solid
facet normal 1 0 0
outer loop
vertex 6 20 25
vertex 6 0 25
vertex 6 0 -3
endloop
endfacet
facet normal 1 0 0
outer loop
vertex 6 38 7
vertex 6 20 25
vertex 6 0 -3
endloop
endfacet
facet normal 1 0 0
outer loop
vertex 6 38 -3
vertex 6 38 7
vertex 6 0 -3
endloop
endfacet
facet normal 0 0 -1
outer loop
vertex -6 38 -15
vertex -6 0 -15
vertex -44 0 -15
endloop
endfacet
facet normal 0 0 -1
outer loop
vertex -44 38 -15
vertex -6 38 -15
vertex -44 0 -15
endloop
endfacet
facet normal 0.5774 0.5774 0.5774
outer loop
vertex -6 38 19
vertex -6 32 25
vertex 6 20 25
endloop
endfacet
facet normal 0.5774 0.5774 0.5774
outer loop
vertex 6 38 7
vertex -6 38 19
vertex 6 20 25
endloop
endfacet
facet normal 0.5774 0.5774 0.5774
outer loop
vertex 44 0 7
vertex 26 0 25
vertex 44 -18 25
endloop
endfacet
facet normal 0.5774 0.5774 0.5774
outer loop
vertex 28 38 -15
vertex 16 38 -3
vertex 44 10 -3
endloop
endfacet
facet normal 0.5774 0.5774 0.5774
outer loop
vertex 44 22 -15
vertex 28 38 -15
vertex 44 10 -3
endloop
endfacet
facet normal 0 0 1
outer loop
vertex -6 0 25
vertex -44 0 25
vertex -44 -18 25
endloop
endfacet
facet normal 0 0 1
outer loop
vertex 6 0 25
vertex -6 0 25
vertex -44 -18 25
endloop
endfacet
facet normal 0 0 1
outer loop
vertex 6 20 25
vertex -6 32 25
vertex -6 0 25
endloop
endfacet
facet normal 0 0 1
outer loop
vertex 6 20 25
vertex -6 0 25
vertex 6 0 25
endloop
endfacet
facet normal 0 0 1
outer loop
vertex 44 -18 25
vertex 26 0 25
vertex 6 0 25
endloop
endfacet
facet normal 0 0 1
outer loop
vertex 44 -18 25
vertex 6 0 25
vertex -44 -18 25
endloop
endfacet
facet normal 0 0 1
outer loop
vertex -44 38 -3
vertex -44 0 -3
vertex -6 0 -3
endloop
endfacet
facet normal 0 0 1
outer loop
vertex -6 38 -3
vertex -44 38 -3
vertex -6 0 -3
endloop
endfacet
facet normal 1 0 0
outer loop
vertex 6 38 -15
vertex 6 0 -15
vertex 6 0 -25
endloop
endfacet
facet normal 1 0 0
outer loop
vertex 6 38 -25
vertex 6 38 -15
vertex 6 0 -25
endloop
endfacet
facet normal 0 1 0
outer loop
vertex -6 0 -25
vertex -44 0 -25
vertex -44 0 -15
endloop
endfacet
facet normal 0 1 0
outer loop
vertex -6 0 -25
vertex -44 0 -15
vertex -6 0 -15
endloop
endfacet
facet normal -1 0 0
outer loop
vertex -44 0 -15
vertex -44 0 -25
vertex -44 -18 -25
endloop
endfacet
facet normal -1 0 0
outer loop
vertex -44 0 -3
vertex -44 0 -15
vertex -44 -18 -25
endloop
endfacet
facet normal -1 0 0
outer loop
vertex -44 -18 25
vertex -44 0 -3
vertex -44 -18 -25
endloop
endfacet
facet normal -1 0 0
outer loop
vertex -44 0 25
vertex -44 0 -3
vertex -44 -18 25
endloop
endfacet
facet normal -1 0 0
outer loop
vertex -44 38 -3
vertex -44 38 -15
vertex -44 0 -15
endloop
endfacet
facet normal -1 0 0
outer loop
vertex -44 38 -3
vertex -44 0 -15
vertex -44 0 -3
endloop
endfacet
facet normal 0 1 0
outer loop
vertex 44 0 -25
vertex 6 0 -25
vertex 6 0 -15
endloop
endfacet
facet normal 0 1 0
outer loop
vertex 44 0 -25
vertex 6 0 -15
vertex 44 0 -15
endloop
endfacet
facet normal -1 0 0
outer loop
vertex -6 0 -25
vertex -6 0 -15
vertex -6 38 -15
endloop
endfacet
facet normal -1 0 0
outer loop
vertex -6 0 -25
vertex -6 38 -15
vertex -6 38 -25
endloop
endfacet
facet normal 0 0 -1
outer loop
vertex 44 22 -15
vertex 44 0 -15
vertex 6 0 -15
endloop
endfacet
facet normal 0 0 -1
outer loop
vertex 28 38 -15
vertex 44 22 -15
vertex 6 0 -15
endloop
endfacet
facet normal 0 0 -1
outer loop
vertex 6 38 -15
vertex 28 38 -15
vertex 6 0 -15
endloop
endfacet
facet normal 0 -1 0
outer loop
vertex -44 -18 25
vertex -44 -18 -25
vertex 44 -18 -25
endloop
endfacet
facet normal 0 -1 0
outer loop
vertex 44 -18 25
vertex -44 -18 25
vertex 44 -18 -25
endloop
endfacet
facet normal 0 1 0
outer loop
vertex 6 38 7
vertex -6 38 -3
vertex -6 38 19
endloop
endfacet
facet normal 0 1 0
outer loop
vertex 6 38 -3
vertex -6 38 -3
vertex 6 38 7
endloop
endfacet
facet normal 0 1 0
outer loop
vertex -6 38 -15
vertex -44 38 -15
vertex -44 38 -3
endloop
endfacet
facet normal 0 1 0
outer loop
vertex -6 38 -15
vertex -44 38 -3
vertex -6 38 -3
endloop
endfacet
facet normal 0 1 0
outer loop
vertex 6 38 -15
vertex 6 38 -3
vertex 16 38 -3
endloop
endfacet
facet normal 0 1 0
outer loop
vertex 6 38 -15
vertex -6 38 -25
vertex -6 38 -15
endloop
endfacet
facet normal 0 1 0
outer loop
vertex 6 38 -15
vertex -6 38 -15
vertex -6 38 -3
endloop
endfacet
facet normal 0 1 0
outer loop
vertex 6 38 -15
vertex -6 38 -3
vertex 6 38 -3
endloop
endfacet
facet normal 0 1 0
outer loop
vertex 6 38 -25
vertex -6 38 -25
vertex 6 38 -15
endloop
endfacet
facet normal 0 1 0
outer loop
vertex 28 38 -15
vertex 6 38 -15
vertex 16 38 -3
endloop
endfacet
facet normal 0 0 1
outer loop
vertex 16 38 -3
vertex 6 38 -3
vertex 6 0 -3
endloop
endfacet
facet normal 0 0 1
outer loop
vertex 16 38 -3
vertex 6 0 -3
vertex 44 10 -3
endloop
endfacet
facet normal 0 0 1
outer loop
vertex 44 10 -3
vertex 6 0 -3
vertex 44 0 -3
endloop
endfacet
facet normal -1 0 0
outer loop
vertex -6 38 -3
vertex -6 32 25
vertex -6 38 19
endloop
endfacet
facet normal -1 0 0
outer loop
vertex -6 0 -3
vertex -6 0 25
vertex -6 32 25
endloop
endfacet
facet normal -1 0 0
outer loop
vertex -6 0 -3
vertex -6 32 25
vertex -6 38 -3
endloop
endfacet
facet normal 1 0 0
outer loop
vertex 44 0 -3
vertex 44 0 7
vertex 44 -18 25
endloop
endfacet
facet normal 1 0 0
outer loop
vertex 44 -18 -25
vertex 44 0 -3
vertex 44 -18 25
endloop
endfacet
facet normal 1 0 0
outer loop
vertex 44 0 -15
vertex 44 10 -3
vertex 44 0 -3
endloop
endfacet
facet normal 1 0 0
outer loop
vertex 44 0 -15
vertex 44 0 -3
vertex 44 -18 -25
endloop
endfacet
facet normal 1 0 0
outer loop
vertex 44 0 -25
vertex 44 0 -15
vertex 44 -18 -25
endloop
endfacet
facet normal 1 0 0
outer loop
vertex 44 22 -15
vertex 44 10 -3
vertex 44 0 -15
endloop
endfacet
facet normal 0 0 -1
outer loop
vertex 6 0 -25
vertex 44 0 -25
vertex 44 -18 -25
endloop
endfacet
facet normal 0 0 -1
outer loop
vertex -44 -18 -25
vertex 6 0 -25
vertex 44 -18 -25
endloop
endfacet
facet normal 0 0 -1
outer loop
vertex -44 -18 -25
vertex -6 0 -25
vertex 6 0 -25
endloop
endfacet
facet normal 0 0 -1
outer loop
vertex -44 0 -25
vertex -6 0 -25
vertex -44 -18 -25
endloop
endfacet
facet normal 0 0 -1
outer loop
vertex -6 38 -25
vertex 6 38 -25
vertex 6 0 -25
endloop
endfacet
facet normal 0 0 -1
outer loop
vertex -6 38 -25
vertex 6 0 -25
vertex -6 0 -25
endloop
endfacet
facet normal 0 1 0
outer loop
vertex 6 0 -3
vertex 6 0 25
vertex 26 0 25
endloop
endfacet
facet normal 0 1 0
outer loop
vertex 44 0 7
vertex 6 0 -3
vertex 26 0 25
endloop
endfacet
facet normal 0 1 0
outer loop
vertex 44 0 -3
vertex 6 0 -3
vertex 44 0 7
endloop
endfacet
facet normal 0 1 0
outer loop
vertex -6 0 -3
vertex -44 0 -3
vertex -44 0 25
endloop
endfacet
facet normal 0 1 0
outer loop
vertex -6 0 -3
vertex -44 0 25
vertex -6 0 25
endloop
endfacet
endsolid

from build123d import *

# Parameters (mm, degrees)
SKETCH1_W           = 38
SKETCH1_H           = 10
SKETCH1_H_2         = 12
SKETCH1_W_2         = 12
SKETCH1_H_3         = 28
BOSS_EXTRUDE1_DEPTH = 18
SKETCH1_3_W         = 38
SKETCH1_3_H         = 12
SKETCH1_3_W_2       = 12
SKETCH1_3_H_2       = 28
SKETCH1_3_H_3       = 10
BOSS_EXTRUDE2_DEPTH = 38


with BuildPart() as part:
    # Sketch1 → Boss-Extrude1 (new body)
    with BuildSketch(Plane(origin=(0, 0, 0), x_dir=(1, 0, 0), z_dir=(0, 1, 0))):
        with Locations((25, 20)):
            Rectangle(SKETCH1_W, SKETCH1_H)
        with Locations((25, 9)):
            Rectangle(SKETCH1_W, SKETCH1_H_2)
        with Locations((0, 9)):
            Rectangle(SKETCH1_W_2, SKETCH1_H_2)
        with Locations((25, -11)):
            Rectangle(SKETCH1_W, SKETCH1_H_3)
        with Locations((0, -11)):
            Rectangle(SKETCH1_W_2, SKETCH1_H_3)
        with Locations((-25, -11)):
            Rectangle(SKETCH1_W, SKETCH1_H_3)
        with Locations((-25, 9)):
            Rectangle(SKETCH1_W, SKETCH1_H_2)
        with Locations((-25, 20)):
            Rectangle(SKETCH1_W, SKETCH1_H)
        with Locations((0, 20)):
            Rectangle(SKETCH1_W_2, SKETCH1_H)
    extrude(amount=-BOSS_EXTRUDE1_DEPTH)

    # Sketch1<3> → Boss-Extrude2 (add)
    with BuildSketch(Plane(origin=(0, 0, 0), x_dir=(1, 0, 0), z_dir=(0, 1, 0))):
        with Locations((-25, 9)):
            Rectangle(SKETCH1_3_W, SKETCH1_3_H)
        with Locations((0, 9)):
            Rectangle(SKETCH1_3_W_2, SKETCH1_3_H)
        with Locations((25, 9)):
            Rectangle(SKETCH1_3_W, SKETCH1_3_H)
        with Locations((0, -11)):
            Rectangle(SKETCH1_3_W_2, SKETCH1_3_H_2)
        with Locations((0, 20)):
            Rectangle(SKETCH1_3_W_2, SKETCH1_3_H_3)
    extrude(amount=BOSS_EXTRUDE2_DEPTH)

    # SurfaceCut5
    split(bisect_by=Plane(origin=(17, 17, 17), x_dir=(0.8164965809277277, -0.4082482904638635, -0.4082482904638593), z_dir=(0.5773502691896235, 0.57735026918963, 0.577350269189624)), keep=Keep.BOTTOM)


solid = part.part
